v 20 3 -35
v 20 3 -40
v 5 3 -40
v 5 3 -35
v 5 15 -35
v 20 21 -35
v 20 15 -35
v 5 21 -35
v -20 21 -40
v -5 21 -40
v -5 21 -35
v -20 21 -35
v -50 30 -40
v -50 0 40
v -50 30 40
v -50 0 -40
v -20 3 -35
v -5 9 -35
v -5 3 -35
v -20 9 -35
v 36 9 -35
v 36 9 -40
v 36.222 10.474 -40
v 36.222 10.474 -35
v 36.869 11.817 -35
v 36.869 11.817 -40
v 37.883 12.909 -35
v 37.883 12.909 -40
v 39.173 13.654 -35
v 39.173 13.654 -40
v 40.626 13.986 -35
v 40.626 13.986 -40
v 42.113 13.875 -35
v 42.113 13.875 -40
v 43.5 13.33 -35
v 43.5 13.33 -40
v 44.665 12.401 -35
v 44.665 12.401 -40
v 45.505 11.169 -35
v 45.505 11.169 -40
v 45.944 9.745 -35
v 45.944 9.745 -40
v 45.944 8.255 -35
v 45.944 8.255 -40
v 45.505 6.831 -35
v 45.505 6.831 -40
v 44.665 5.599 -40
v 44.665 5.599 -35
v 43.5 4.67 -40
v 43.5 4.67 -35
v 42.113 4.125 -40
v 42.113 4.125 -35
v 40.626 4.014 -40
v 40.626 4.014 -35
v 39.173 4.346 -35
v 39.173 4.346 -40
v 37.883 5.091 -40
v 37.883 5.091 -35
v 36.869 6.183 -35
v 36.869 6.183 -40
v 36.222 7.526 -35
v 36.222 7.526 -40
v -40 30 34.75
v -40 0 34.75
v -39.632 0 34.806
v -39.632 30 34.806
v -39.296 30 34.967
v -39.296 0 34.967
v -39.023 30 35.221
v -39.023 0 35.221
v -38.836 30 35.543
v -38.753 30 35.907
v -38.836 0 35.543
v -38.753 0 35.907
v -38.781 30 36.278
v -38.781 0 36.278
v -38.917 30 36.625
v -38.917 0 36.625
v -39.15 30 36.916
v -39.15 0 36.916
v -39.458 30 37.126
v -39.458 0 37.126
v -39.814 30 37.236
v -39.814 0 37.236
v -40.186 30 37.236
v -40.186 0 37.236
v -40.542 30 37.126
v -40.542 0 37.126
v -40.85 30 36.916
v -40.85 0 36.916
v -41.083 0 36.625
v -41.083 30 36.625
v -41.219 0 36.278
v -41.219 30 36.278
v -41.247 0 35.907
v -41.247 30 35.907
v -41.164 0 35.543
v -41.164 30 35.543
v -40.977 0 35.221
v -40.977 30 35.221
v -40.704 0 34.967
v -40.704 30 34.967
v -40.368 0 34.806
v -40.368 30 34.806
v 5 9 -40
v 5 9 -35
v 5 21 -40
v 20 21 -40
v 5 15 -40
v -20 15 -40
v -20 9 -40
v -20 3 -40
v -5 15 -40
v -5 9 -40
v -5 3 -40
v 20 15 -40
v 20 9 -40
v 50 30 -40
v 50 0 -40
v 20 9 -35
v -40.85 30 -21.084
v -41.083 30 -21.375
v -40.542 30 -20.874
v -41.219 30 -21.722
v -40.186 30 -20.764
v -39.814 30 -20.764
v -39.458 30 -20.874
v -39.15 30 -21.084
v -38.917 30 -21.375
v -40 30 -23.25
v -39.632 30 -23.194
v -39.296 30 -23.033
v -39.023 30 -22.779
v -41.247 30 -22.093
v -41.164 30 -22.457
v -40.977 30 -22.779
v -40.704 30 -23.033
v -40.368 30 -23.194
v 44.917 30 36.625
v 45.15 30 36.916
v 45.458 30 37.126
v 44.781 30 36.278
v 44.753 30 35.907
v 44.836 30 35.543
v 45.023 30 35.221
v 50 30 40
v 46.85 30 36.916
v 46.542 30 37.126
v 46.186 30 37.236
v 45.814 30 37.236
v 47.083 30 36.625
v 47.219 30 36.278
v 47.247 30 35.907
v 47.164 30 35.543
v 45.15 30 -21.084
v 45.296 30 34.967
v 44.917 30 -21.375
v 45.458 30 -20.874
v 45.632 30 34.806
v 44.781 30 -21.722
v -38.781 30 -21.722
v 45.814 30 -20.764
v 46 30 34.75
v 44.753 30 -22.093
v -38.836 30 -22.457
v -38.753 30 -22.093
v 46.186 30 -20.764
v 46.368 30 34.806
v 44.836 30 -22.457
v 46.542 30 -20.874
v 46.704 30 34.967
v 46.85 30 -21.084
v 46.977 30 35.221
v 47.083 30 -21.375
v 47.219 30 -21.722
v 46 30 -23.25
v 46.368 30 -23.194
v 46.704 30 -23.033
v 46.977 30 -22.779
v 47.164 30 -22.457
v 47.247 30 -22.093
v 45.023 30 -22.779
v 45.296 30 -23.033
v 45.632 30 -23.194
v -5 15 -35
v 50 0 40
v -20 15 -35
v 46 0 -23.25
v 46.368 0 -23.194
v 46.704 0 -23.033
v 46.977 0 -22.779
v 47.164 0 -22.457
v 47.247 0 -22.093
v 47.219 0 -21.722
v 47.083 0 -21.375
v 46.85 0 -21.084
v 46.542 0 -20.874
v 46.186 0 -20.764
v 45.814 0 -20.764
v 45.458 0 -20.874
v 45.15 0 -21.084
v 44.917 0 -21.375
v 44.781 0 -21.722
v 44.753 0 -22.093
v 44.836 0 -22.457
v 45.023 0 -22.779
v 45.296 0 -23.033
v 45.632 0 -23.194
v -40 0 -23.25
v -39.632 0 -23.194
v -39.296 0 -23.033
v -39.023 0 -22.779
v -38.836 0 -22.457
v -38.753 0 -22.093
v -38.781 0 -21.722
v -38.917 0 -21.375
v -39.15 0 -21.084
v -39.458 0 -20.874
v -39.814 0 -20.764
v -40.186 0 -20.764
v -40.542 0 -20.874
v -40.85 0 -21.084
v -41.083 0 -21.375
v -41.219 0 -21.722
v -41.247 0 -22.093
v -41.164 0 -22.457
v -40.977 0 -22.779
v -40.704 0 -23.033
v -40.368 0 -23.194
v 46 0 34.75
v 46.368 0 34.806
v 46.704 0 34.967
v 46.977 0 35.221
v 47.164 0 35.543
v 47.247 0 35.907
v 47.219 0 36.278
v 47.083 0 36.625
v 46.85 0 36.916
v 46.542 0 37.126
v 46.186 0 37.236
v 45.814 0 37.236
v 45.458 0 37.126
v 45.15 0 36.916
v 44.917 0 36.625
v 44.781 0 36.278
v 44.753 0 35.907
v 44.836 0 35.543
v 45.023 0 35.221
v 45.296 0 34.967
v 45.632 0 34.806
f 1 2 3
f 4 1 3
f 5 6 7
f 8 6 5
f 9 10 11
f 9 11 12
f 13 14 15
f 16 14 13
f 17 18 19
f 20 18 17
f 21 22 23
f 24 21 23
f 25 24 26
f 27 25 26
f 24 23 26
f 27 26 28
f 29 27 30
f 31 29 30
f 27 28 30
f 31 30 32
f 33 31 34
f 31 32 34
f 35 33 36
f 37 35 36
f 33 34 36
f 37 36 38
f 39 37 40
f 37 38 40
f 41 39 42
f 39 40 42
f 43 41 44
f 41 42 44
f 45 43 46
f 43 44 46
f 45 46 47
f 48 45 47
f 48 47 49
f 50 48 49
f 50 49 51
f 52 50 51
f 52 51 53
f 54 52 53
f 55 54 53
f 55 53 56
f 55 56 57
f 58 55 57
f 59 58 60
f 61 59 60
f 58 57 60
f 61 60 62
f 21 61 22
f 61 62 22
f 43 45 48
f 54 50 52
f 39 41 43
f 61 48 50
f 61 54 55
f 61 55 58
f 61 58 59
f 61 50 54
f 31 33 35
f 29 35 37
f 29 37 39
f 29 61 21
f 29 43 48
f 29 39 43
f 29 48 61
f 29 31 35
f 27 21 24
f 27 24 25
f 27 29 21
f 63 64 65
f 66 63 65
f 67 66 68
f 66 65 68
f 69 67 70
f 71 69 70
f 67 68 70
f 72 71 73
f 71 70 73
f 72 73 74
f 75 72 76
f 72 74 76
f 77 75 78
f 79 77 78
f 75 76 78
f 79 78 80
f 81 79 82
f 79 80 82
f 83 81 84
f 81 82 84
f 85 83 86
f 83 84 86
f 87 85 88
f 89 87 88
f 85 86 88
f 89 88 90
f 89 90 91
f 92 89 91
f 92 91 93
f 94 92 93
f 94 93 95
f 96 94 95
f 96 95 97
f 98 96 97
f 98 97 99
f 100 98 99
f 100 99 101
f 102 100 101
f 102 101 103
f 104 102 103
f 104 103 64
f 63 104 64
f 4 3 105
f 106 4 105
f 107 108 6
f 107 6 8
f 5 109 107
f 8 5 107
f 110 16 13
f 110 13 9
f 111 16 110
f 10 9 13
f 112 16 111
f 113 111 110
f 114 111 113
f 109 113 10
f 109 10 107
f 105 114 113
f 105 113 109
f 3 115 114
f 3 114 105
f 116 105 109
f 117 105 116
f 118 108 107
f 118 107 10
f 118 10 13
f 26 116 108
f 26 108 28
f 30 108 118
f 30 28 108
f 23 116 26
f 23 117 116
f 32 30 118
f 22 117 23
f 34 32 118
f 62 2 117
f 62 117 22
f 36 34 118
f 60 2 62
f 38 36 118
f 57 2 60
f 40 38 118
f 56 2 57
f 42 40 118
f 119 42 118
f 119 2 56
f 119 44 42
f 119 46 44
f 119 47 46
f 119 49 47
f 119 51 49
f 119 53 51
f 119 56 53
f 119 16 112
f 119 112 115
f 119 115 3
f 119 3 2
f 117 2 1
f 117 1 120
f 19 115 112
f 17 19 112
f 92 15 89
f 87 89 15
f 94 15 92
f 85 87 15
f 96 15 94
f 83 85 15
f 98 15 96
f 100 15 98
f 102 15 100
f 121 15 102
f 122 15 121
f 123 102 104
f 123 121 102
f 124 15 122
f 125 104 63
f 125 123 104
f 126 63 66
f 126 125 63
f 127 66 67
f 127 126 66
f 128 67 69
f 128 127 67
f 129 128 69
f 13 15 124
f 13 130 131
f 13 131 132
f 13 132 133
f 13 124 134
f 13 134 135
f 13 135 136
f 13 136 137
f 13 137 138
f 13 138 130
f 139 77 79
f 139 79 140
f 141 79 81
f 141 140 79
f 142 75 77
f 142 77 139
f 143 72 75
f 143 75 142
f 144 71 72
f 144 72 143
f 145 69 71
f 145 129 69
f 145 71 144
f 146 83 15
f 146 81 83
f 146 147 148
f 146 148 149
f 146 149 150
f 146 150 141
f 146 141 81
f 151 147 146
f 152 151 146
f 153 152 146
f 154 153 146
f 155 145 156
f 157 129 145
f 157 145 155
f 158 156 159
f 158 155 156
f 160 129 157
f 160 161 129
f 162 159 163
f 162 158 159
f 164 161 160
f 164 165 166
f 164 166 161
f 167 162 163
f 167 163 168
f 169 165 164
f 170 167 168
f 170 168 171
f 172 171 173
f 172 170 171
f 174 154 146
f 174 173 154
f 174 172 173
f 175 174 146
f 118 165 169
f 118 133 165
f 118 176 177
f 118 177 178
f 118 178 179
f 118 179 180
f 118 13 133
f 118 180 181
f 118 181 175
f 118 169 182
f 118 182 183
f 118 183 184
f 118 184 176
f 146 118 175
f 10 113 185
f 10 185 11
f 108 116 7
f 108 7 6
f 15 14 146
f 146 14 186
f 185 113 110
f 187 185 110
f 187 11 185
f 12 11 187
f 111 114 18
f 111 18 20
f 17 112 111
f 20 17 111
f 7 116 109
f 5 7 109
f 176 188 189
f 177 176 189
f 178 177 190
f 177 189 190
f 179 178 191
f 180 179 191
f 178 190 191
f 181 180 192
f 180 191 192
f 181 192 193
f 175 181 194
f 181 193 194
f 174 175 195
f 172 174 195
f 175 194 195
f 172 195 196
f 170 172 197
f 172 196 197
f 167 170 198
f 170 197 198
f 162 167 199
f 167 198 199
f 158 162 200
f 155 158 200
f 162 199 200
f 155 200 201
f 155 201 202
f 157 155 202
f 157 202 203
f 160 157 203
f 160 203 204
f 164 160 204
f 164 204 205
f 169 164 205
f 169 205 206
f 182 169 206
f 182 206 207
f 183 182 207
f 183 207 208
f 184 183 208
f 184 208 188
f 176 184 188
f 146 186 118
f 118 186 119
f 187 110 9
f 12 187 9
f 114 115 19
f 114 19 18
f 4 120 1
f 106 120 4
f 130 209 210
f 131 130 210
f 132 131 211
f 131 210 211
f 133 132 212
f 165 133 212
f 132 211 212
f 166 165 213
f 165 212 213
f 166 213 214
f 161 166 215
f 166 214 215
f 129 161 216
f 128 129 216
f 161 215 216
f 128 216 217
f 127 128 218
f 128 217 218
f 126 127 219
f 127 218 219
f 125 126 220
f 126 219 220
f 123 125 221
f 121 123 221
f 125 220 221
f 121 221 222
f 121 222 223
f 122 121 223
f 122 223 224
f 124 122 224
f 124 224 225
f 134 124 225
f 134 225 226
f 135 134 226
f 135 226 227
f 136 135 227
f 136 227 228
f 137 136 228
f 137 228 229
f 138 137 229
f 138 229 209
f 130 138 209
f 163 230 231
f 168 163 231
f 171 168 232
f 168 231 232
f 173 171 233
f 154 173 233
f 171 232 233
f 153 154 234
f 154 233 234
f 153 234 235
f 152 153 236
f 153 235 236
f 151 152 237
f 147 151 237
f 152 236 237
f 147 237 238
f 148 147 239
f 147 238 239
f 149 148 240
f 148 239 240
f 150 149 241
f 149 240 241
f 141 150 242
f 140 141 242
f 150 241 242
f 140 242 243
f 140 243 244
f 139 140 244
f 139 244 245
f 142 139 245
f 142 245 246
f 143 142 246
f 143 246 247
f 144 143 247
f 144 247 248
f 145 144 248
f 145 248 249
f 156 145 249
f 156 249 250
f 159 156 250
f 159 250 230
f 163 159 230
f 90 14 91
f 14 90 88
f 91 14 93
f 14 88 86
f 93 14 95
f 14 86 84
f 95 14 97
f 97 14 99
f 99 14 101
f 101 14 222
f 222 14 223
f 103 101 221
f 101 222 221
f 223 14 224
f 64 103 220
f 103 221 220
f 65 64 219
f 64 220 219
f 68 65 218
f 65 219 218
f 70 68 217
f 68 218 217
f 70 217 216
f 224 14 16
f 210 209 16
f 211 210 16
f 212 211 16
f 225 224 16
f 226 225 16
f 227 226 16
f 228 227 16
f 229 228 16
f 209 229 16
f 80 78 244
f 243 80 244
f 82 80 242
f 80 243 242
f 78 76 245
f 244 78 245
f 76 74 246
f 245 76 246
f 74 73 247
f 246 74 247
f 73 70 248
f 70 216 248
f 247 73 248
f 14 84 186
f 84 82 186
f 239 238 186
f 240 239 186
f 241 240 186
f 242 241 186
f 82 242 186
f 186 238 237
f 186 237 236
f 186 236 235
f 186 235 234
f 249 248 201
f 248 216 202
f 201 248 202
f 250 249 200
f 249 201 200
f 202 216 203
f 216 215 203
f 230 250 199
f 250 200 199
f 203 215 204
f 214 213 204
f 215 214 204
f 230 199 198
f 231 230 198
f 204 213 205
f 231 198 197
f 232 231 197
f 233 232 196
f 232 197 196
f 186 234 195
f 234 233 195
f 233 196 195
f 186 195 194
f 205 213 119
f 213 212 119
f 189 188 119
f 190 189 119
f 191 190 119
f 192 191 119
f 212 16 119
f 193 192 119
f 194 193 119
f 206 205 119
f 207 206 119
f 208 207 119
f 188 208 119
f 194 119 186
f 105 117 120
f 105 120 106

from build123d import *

# Parameters (mm, degrees)
SKETCH_1_W          = 100
SKETCH_1_H          = 80
EXTRUDE_1_DEPTH     = 30
SKETCH_2_R          = 5
CUT_EXTRUDE_1_DEPTH = 5
SKETCH_3_W          = 15
SKETCH_3_H          = 6
CUT_EXTRUDE_2_DEPTH = 5
SKETCH_5_R          = 1.25
CUT_EXTRUDE_3_DEPTH = 51


with BuildPart() as part:
    # 草图1 → 凸台-拉伸1 (new body)
    with BuildSketch(Plane(origin=(0, 0, 0), x_dir=(1, 0, 0), z_dir=(0, 1, 0))):
        Rectangle(SKETCH_1_W, SKETCH_1_H)
    extrude(amount=EXTRUDE_1_DEPTH)

    # 草图2 → 切除-拉伸1 (cut)
    with BuildSketch(Plane(origin=(0, 0, -40), x_dir=(-1, 0, 0), z_dir=(0, 0, -1))):
        with Locations((-41, 9)):
            Circle(SKETCH_2_R)
    extrude(amount=-CUT_EXTRUDE_1_DEPTH, mode=Mode.SUBTRACT)

    # 草图3 → 切除-拉伸2 (cut)
    with BuildSketch(Plane(origin=(0, 0, -40), x_dir=(-1, 0, 0), z_dir=(0, 0, -1))):
        with Locations((-12.5, 18)):
            Rectangle(SKETCH_3_W, SKETCH_3_H)
        with Locations((12.5, 18)):
            Rectangle(SKETCH_3_W, SKETCH_3_H)
        with Locations((-12.5, 6)):
            Rectangle(SKETCH_3_W, SKETCH_3_H)
        with Locations((12.5, 6)):
            Rectangle(SKETCH_3_W, SKETCH_3_H)
    extrude(amount=-CUT_EXTRUDE_2_DEPTH, mode=Mode.SUBTRACT)

    # 草图5 → 切除-拉伸3 (cut)
    with BuildSketch(Plane.XZ):
        with Locations(Location((46, 36, 0), (0, 0, 270))):
            Circle(SKETCH_5_R)
        with Locations(Location((-40, 36, 0), (0, 0, 270))):
            Circle(SKETCH_5_R)
        with Locations(Location((-40, -22, 0), (0, 0, 270))):
            Circle(SKETCH_5_R)
        with Locations(Location((46, -22, 0), (0, 0, 270))):
            Circle(SKETCH_5_R)
    extrude(amount=-CUT_EXTRUDE_3_DEPTH, mode=Mode.SUBTRACT)


solid = part.part
